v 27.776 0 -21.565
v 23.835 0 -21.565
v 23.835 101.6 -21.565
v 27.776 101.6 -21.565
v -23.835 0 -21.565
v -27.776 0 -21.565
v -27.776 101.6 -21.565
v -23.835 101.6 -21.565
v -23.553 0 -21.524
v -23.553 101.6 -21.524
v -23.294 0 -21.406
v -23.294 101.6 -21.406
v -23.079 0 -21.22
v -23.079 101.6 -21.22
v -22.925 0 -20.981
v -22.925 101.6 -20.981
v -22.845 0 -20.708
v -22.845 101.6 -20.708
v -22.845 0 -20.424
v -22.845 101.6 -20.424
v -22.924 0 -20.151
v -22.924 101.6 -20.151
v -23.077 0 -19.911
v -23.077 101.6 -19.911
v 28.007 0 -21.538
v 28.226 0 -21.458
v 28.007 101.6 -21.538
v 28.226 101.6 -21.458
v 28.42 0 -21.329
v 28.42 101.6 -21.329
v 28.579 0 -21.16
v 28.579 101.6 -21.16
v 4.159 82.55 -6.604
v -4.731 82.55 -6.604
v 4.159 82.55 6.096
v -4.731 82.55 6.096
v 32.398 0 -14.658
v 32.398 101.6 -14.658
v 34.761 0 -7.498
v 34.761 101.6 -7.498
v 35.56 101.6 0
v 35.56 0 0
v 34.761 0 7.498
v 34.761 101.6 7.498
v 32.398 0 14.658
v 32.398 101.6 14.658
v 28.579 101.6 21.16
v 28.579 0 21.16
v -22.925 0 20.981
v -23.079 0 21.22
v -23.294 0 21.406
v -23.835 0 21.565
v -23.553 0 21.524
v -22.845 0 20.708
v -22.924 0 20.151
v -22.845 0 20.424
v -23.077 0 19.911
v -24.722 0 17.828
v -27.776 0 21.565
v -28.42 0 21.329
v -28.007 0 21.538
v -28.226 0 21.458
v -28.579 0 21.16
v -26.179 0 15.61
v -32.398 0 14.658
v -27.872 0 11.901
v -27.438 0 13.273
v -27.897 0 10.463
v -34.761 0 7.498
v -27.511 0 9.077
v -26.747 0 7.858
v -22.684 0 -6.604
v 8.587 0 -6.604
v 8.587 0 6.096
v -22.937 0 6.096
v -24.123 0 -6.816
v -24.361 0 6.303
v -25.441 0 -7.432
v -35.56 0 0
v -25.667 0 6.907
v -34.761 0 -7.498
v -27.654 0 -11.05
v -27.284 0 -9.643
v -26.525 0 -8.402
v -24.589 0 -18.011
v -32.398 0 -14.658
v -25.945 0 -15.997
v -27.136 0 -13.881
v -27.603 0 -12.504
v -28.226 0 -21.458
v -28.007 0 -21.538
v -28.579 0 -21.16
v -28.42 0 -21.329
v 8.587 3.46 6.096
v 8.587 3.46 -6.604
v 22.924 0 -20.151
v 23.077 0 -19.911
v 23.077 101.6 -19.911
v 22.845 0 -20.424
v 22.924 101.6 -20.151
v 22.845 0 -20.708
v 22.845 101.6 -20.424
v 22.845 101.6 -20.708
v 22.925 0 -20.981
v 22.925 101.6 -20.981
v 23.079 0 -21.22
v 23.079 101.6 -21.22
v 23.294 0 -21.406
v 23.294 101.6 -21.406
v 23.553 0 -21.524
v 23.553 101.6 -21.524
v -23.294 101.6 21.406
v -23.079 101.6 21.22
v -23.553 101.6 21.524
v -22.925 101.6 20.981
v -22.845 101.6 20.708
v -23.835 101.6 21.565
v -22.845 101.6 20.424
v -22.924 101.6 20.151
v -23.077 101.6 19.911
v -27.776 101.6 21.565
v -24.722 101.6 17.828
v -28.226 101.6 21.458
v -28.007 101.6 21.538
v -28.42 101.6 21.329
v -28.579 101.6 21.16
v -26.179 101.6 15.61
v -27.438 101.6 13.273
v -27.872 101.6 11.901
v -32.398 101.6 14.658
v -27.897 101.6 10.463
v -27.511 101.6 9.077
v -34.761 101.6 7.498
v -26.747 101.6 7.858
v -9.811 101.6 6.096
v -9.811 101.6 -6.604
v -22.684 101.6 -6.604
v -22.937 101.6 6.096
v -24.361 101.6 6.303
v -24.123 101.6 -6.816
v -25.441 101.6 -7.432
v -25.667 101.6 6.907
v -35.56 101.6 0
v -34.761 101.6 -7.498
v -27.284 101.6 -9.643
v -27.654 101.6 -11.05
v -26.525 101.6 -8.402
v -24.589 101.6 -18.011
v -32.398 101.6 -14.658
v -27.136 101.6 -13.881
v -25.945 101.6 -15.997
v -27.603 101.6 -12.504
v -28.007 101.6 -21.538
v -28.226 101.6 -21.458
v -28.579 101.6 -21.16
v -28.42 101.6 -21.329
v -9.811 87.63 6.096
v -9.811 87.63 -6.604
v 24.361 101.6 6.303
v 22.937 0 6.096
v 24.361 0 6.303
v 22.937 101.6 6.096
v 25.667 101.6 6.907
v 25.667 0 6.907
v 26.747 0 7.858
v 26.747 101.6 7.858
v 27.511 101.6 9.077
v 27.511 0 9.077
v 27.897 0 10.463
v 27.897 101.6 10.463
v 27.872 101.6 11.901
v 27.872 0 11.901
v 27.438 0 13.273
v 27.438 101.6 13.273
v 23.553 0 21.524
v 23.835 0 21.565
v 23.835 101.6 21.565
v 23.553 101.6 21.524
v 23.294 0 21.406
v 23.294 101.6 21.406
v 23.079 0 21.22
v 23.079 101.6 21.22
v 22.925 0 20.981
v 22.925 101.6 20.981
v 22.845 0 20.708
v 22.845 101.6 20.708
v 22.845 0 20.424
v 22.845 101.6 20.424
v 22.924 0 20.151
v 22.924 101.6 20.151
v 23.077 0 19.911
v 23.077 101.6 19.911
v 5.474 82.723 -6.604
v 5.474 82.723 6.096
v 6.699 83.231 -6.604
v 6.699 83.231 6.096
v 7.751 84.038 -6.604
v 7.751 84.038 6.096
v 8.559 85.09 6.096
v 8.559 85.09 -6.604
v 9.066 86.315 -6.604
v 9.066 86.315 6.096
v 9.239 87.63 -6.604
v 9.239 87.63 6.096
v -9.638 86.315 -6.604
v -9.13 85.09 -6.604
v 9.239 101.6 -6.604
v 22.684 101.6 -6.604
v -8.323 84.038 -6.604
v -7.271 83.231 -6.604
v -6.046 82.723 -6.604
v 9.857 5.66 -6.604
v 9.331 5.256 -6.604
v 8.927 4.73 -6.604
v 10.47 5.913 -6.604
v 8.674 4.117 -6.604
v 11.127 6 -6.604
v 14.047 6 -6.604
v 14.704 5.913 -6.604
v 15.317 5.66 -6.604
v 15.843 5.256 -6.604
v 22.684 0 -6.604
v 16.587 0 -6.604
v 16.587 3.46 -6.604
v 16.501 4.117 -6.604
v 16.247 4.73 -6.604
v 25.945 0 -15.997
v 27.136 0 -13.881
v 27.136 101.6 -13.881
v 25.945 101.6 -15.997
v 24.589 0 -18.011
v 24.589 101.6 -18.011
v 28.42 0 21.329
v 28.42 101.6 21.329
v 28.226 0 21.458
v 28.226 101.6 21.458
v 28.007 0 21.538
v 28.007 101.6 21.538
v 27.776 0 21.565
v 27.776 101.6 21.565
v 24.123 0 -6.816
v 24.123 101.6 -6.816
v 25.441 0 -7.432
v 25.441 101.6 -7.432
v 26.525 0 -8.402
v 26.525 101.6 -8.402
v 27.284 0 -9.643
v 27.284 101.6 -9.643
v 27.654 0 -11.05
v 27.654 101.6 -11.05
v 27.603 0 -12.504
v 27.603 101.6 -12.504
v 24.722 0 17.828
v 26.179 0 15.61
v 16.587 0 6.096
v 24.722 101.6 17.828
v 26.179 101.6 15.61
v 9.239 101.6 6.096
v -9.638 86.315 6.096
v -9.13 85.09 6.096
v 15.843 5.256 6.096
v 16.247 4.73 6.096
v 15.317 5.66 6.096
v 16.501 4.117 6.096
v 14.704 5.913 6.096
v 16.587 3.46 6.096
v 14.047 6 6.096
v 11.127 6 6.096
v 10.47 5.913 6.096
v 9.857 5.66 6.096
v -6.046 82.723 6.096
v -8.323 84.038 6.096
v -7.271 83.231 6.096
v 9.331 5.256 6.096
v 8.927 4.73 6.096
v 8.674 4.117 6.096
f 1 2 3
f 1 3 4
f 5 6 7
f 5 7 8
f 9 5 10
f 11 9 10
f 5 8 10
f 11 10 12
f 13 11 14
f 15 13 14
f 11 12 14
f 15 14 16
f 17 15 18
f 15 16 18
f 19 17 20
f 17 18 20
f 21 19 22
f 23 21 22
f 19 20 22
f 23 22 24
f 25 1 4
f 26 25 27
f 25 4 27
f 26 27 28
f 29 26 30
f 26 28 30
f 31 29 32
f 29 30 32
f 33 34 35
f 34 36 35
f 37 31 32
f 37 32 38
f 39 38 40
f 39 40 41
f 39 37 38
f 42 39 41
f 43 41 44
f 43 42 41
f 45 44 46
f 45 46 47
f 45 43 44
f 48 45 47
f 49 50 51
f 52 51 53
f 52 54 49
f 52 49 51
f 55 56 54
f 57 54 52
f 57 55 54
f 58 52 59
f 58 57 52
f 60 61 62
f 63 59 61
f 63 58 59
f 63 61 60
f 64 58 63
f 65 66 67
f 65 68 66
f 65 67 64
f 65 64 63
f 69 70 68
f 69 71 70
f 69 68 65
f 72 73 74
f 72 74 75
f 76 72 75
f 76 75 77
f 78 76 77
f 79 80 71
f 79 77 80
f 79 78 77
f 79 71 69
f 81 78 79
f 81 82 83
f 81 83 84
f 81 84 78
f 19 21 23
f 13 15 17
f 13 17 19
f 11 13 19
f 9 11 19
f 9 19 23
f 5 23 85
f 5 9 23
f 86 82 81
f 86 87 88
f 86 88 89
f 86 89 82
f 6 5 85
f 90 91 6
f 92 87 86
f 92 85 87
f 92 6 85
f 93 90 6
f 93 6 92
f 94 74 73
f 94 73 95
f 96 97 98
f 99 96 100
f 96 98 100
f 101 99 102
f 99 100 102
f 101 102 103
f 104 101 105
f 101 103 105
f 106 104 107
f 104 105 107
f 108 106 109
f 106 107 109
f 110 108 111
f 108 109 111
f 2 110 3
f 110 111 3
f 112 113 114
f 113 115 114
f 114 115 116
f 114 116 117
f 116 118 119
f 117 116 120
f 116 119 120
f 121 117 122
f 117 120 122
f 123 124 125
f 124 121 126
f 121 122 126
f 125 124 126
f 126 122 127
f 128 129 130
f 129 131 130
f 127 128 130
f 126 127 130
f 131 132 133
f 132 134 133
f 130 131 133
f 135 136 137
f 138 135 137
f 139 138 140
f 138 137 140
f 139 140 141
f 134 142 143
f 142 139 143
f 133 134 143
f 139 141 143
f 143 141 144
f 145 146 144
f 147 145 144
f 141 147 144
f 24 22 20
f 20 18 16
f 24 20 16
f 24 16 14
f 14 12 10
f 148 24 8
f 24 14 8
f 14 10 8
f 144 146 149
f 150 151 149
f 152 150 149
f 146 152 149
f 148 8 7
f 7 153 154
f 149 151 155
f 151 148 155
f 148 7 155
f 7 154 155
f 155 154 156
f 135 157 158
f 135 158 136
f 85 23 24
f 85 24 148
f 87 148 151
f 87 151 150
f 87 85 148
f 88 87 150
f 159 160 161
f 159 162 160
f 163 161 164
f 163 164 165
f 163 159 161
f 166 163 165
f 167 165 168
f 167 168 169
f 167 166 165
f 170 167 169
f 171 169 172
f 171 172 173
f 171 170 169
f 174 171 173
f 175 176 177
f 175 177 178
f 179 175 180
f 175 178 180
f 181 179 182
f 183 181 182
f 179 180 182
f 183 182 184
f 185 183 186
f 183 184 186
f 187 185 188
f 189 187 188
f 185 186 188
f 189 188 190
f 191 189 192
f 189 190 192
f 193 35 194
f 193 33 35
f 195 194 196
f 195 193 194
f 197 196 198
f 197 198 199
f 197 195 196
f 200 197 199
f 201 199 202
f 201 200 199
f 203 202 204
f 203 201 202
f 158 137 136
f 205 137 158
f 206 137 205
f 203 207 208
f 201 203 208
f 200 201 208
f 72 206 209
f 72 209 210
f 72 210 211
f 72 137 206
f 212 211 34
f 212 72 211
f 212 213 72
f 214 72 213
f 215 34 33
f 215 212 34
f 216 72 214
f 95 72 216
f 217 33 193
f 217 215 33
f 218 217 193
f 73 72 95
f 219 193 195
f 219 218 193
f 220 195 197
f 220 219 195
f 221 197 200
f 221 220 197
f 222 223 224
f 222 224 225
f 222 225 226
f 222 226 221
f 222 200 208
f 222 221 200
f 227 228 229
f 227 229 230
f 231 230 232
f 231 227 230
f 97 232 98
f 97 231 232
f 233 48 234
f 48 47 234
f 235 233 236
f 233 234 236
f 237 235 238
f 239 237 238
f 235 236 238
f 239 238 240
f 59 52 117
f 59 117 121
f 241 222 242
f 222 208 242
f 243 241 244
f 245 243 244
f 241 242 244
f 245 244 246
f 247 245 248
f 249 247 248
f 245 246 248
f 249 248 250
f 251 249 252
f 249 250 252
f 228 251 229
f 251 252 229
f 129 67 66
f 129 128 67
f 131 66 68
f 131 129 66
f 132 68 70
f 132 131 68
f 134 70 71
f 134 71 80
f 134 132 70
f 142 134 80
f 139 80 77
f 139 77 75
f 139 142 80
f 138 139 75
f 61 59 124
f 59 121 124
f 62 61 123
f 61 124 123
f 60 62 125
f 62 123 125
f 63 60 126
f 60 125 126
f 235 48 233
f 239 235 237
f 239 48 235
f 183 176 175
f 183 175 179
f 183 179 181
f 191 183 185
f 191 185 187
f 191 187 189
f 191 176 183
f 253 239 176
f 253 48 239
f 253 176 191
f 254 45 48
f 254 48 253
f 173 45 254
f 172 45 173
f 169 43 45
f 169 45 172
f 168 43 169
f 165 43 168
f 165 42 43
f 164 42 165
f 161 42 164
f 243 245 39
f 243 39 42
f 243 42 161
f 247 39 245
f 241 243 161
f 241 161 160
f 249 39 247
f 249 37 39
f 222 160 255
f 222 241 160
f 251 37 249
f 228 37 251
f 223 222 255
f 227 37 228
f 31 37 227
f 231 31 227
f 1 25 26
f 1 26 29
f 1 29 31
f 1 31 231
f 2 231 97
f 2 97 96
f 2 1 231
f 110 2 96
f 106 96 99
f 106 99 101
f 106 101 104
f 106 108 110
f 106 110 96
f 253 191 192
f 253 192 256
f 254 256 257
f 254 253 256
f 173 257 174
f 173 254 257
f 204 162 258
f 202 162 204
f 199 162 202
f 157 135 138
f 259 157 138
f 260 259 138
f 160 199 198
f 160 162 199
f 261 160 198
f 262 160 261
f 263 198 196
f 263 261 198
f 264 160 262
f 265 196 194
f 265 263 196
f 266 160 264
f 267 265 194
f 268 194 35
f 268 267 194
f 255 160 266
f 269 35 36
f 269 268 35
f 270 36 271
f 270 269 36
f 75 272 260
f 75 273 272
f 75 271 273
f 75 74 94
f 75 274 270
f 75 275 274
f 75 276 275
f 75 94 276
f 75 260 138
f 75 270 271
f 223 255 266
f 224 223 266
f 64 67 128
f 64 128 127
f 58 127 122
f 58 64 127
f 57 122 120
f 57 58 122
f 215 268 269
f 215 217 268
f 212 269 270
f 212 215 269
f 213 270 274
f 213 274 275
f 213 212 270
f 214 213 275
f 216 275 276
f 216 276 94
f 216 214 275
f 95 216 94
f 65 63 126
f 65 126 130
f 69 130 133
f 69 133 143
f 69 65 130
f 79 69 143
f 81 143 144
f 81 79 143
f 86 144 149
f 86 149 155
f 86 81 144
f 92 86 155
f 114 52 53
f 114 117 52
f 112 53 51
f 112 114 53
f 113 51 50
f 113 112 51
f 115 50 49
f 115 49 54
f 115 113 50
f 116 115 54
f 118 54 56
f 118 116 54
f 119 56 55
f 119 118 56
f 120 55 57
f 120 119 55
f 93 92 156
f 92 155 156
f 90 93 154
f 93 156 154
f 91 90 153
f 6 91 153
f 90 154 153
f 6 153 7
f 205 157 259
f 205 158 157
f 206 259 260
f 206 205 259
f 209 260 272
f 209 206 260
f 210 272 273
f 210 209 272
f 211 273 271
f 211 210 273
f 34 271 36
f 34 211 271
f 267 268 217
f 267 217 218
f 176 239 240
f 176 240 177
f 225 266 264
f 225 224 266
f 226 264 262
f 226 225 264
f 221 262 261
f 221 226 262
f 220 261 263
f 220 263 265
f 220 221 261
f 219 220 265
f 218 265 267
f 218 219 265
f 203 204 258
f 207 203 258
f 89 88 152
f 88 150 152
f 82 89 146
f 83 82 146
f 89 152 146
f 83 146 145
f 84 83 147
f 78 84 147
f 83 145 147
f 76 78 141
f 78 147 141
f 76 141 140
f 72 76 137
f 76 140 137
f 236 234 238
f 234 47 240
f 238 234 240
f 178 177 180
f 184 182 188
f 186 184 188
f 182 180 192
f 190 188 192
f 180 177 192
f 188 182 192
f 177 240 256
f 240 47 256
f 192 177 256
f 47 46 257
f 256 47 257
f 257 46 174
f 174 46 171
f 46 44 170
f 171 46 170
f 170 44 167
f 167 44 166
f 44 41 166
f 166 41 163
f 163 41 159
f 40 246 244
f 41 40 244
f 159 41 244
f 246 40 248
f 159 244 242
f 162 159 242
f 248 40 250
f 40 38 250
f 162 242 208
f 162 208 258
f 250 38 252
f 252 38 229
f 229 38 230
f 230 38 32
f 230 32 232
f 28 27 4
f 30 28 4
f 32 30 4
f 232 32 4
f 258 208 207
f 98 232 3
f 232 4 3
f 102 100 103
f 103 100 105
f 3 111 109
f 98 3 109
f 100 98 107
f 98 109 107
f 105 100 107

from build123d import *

# Parameters (mm, degrees)
BOSS_EXTRUDE2_DEPTH = 101.6
FILLET3_R           = 1
FILLET5_R           = 5
SKETCH8_R           = 3.175
CUT_EXTRUDE3_DEPTH  = 19.05
SKETCH9_W           = 19.05
SKETCH9_H           = 19.05
CUT_EXTRUDE4_DEPTH  = 12.7
FILLET6_R           = 5.08
SKETCH11_W          = 8
SKETCH11_H          = 12
CUT_EXTRUDE5_DEPTH  = 12.7
FILLET7_R           = 2.54


with BuildPart() as part:
    # Sketch2 → Boss-Extrude2 (new body)
    with BuildSketch(Plane(origin=(0, 0, 0), x_dir=(1, 0, 0), z_dir=(0, 1, 0))):
        with BuildLine():
            Line((-21.540573528, -21.56464913), (-28.275068663, -21.56464913))
            ThreePointArc((-28.275068663, -21.56464913), (-35.56, 0), (-28.275068663, 21.56464913))
            Line((-28.275068663, 21.56464913), (-21.540573528, 21.56464913))
            ThreePointArc((-21.540573528, 21.56464913), (-26.716830431, 14.671106698), (-29.7559672, 6.604))
            Line((-29.7559672, 6.604), (29.7559672, 6.604))
            ThreePointArc((29.7559672, 6.604), (26.716830431, 14.671106698), (21.540573528, 21.56464913))
            Line((21.540573528, 21.56464913), (28.275068663, 21.56464913))
            ThreePointArc((28.275068663, 21.56464913), (35.56, 0), (28.275068663, -21.56464913))
            Line((28.275068663, -21.56464913), (21.540573528, -21.56464913))
            ThreePointArc((21.540573528, -21.56464913), (26.840862889, -14.442938737), (29.864178944, -6.096))
            Line((29.864178944, -6.096), (-29.864178944, -6.096))
            ThreePointArc((-29.864178944, -6.096), (-26.840862889, -14.442938737), (-21.540573528, -21.56464913))
        make_face()
    extrude(amount=BOSS_EXTRUDE2_DEPTH)

    # Fillet3
    fillet3_edges = [part.edges().sort_by_distance(p)[0] for p in [
        (21.540573528, 50.8, -21.56464913),
        (28.275068663, 50.8, -21.56464913),
        (28.275068663, 50.8, 21.56464913),
        (21.540573528, 50.8, 21.56464913),
        (-21.540573528, 50.8, 21.56464913),
        (-28.275068663, 50.8, 21.56464913),
        (-28.275068663, 50.8, -21.56464913),
        (-21.540573528, 50.8, -21.56464913),
    ]]
    fillet(fillet3_edges, radius=FILLET3_R)

    # Fillet5
    fillet5_edges = [part.edges().sort_by_distance(p)[0] for p in [
        (29.864178944, 50.8, 6.096),
        (-29.864178944, 50.8, 6.096),
        (-29.7559672, 50.8, -6.604),
        (29.7559672, 50.8, -6.604),
    ]]
    fillet(fillet5_edges, radius=FILLET5_R)

    # Sketch8 → Cut-Extrude3 (cut)
    with BuildSketch(Plane(origin=(0, 101.6, 0), x_dir=(1, 0, 0), z_dir=(0, 1, 0))):
        Circle(SKETCH8_R)
    extrude(amount=-CUT_EXTRUDE3_DEPTH, mode=Mode.SUBTRACT)

    # Sketch9 → Cut-Extrude4 (cut)
    with BuildSketch(Plane.XY.offset(6.096)):
        with Locations((-0.285711728, 92.075)):
            Rectangle(SKETCH9_W, SKETCH9_H)
    extrude(amount=-CUT_EXTRUDE4_DEPTH, mode=Mode.SUBTRACT)

    # Fillet6
    fillet6_edges = [part.edges().sort_by_distance(p)[0] for p in [
        (9.239288272, 82.55, -0.254),
        (-9.810711728, 82.55, -0.254),
    ]]
    fillet(fillet6_edges, radius=FILLET6_R)

    # Sketch11 → Cut-Extrude5 (cut)
    with BuildSketch(Plane.XY.offset(6.096)):
        with Locations((12.587070083, 0)):
            Rectangle(SKETCH11_W, SKETCH11_H)
    extrude(amount=-CUT_EXTRUDE5_DEPTH, mode=Mode.SUBTRACT)

    # Fillet7
    fillet7_edges = [part.edges().sort_by_distance(p)[0] for p in [
        (16.587070083, 6, -0.254),
        (8.587070083, 6, -0.254),
    ]]
    fillet(fillet7_edges, radius=FILLET7_R)


solid = part.part
